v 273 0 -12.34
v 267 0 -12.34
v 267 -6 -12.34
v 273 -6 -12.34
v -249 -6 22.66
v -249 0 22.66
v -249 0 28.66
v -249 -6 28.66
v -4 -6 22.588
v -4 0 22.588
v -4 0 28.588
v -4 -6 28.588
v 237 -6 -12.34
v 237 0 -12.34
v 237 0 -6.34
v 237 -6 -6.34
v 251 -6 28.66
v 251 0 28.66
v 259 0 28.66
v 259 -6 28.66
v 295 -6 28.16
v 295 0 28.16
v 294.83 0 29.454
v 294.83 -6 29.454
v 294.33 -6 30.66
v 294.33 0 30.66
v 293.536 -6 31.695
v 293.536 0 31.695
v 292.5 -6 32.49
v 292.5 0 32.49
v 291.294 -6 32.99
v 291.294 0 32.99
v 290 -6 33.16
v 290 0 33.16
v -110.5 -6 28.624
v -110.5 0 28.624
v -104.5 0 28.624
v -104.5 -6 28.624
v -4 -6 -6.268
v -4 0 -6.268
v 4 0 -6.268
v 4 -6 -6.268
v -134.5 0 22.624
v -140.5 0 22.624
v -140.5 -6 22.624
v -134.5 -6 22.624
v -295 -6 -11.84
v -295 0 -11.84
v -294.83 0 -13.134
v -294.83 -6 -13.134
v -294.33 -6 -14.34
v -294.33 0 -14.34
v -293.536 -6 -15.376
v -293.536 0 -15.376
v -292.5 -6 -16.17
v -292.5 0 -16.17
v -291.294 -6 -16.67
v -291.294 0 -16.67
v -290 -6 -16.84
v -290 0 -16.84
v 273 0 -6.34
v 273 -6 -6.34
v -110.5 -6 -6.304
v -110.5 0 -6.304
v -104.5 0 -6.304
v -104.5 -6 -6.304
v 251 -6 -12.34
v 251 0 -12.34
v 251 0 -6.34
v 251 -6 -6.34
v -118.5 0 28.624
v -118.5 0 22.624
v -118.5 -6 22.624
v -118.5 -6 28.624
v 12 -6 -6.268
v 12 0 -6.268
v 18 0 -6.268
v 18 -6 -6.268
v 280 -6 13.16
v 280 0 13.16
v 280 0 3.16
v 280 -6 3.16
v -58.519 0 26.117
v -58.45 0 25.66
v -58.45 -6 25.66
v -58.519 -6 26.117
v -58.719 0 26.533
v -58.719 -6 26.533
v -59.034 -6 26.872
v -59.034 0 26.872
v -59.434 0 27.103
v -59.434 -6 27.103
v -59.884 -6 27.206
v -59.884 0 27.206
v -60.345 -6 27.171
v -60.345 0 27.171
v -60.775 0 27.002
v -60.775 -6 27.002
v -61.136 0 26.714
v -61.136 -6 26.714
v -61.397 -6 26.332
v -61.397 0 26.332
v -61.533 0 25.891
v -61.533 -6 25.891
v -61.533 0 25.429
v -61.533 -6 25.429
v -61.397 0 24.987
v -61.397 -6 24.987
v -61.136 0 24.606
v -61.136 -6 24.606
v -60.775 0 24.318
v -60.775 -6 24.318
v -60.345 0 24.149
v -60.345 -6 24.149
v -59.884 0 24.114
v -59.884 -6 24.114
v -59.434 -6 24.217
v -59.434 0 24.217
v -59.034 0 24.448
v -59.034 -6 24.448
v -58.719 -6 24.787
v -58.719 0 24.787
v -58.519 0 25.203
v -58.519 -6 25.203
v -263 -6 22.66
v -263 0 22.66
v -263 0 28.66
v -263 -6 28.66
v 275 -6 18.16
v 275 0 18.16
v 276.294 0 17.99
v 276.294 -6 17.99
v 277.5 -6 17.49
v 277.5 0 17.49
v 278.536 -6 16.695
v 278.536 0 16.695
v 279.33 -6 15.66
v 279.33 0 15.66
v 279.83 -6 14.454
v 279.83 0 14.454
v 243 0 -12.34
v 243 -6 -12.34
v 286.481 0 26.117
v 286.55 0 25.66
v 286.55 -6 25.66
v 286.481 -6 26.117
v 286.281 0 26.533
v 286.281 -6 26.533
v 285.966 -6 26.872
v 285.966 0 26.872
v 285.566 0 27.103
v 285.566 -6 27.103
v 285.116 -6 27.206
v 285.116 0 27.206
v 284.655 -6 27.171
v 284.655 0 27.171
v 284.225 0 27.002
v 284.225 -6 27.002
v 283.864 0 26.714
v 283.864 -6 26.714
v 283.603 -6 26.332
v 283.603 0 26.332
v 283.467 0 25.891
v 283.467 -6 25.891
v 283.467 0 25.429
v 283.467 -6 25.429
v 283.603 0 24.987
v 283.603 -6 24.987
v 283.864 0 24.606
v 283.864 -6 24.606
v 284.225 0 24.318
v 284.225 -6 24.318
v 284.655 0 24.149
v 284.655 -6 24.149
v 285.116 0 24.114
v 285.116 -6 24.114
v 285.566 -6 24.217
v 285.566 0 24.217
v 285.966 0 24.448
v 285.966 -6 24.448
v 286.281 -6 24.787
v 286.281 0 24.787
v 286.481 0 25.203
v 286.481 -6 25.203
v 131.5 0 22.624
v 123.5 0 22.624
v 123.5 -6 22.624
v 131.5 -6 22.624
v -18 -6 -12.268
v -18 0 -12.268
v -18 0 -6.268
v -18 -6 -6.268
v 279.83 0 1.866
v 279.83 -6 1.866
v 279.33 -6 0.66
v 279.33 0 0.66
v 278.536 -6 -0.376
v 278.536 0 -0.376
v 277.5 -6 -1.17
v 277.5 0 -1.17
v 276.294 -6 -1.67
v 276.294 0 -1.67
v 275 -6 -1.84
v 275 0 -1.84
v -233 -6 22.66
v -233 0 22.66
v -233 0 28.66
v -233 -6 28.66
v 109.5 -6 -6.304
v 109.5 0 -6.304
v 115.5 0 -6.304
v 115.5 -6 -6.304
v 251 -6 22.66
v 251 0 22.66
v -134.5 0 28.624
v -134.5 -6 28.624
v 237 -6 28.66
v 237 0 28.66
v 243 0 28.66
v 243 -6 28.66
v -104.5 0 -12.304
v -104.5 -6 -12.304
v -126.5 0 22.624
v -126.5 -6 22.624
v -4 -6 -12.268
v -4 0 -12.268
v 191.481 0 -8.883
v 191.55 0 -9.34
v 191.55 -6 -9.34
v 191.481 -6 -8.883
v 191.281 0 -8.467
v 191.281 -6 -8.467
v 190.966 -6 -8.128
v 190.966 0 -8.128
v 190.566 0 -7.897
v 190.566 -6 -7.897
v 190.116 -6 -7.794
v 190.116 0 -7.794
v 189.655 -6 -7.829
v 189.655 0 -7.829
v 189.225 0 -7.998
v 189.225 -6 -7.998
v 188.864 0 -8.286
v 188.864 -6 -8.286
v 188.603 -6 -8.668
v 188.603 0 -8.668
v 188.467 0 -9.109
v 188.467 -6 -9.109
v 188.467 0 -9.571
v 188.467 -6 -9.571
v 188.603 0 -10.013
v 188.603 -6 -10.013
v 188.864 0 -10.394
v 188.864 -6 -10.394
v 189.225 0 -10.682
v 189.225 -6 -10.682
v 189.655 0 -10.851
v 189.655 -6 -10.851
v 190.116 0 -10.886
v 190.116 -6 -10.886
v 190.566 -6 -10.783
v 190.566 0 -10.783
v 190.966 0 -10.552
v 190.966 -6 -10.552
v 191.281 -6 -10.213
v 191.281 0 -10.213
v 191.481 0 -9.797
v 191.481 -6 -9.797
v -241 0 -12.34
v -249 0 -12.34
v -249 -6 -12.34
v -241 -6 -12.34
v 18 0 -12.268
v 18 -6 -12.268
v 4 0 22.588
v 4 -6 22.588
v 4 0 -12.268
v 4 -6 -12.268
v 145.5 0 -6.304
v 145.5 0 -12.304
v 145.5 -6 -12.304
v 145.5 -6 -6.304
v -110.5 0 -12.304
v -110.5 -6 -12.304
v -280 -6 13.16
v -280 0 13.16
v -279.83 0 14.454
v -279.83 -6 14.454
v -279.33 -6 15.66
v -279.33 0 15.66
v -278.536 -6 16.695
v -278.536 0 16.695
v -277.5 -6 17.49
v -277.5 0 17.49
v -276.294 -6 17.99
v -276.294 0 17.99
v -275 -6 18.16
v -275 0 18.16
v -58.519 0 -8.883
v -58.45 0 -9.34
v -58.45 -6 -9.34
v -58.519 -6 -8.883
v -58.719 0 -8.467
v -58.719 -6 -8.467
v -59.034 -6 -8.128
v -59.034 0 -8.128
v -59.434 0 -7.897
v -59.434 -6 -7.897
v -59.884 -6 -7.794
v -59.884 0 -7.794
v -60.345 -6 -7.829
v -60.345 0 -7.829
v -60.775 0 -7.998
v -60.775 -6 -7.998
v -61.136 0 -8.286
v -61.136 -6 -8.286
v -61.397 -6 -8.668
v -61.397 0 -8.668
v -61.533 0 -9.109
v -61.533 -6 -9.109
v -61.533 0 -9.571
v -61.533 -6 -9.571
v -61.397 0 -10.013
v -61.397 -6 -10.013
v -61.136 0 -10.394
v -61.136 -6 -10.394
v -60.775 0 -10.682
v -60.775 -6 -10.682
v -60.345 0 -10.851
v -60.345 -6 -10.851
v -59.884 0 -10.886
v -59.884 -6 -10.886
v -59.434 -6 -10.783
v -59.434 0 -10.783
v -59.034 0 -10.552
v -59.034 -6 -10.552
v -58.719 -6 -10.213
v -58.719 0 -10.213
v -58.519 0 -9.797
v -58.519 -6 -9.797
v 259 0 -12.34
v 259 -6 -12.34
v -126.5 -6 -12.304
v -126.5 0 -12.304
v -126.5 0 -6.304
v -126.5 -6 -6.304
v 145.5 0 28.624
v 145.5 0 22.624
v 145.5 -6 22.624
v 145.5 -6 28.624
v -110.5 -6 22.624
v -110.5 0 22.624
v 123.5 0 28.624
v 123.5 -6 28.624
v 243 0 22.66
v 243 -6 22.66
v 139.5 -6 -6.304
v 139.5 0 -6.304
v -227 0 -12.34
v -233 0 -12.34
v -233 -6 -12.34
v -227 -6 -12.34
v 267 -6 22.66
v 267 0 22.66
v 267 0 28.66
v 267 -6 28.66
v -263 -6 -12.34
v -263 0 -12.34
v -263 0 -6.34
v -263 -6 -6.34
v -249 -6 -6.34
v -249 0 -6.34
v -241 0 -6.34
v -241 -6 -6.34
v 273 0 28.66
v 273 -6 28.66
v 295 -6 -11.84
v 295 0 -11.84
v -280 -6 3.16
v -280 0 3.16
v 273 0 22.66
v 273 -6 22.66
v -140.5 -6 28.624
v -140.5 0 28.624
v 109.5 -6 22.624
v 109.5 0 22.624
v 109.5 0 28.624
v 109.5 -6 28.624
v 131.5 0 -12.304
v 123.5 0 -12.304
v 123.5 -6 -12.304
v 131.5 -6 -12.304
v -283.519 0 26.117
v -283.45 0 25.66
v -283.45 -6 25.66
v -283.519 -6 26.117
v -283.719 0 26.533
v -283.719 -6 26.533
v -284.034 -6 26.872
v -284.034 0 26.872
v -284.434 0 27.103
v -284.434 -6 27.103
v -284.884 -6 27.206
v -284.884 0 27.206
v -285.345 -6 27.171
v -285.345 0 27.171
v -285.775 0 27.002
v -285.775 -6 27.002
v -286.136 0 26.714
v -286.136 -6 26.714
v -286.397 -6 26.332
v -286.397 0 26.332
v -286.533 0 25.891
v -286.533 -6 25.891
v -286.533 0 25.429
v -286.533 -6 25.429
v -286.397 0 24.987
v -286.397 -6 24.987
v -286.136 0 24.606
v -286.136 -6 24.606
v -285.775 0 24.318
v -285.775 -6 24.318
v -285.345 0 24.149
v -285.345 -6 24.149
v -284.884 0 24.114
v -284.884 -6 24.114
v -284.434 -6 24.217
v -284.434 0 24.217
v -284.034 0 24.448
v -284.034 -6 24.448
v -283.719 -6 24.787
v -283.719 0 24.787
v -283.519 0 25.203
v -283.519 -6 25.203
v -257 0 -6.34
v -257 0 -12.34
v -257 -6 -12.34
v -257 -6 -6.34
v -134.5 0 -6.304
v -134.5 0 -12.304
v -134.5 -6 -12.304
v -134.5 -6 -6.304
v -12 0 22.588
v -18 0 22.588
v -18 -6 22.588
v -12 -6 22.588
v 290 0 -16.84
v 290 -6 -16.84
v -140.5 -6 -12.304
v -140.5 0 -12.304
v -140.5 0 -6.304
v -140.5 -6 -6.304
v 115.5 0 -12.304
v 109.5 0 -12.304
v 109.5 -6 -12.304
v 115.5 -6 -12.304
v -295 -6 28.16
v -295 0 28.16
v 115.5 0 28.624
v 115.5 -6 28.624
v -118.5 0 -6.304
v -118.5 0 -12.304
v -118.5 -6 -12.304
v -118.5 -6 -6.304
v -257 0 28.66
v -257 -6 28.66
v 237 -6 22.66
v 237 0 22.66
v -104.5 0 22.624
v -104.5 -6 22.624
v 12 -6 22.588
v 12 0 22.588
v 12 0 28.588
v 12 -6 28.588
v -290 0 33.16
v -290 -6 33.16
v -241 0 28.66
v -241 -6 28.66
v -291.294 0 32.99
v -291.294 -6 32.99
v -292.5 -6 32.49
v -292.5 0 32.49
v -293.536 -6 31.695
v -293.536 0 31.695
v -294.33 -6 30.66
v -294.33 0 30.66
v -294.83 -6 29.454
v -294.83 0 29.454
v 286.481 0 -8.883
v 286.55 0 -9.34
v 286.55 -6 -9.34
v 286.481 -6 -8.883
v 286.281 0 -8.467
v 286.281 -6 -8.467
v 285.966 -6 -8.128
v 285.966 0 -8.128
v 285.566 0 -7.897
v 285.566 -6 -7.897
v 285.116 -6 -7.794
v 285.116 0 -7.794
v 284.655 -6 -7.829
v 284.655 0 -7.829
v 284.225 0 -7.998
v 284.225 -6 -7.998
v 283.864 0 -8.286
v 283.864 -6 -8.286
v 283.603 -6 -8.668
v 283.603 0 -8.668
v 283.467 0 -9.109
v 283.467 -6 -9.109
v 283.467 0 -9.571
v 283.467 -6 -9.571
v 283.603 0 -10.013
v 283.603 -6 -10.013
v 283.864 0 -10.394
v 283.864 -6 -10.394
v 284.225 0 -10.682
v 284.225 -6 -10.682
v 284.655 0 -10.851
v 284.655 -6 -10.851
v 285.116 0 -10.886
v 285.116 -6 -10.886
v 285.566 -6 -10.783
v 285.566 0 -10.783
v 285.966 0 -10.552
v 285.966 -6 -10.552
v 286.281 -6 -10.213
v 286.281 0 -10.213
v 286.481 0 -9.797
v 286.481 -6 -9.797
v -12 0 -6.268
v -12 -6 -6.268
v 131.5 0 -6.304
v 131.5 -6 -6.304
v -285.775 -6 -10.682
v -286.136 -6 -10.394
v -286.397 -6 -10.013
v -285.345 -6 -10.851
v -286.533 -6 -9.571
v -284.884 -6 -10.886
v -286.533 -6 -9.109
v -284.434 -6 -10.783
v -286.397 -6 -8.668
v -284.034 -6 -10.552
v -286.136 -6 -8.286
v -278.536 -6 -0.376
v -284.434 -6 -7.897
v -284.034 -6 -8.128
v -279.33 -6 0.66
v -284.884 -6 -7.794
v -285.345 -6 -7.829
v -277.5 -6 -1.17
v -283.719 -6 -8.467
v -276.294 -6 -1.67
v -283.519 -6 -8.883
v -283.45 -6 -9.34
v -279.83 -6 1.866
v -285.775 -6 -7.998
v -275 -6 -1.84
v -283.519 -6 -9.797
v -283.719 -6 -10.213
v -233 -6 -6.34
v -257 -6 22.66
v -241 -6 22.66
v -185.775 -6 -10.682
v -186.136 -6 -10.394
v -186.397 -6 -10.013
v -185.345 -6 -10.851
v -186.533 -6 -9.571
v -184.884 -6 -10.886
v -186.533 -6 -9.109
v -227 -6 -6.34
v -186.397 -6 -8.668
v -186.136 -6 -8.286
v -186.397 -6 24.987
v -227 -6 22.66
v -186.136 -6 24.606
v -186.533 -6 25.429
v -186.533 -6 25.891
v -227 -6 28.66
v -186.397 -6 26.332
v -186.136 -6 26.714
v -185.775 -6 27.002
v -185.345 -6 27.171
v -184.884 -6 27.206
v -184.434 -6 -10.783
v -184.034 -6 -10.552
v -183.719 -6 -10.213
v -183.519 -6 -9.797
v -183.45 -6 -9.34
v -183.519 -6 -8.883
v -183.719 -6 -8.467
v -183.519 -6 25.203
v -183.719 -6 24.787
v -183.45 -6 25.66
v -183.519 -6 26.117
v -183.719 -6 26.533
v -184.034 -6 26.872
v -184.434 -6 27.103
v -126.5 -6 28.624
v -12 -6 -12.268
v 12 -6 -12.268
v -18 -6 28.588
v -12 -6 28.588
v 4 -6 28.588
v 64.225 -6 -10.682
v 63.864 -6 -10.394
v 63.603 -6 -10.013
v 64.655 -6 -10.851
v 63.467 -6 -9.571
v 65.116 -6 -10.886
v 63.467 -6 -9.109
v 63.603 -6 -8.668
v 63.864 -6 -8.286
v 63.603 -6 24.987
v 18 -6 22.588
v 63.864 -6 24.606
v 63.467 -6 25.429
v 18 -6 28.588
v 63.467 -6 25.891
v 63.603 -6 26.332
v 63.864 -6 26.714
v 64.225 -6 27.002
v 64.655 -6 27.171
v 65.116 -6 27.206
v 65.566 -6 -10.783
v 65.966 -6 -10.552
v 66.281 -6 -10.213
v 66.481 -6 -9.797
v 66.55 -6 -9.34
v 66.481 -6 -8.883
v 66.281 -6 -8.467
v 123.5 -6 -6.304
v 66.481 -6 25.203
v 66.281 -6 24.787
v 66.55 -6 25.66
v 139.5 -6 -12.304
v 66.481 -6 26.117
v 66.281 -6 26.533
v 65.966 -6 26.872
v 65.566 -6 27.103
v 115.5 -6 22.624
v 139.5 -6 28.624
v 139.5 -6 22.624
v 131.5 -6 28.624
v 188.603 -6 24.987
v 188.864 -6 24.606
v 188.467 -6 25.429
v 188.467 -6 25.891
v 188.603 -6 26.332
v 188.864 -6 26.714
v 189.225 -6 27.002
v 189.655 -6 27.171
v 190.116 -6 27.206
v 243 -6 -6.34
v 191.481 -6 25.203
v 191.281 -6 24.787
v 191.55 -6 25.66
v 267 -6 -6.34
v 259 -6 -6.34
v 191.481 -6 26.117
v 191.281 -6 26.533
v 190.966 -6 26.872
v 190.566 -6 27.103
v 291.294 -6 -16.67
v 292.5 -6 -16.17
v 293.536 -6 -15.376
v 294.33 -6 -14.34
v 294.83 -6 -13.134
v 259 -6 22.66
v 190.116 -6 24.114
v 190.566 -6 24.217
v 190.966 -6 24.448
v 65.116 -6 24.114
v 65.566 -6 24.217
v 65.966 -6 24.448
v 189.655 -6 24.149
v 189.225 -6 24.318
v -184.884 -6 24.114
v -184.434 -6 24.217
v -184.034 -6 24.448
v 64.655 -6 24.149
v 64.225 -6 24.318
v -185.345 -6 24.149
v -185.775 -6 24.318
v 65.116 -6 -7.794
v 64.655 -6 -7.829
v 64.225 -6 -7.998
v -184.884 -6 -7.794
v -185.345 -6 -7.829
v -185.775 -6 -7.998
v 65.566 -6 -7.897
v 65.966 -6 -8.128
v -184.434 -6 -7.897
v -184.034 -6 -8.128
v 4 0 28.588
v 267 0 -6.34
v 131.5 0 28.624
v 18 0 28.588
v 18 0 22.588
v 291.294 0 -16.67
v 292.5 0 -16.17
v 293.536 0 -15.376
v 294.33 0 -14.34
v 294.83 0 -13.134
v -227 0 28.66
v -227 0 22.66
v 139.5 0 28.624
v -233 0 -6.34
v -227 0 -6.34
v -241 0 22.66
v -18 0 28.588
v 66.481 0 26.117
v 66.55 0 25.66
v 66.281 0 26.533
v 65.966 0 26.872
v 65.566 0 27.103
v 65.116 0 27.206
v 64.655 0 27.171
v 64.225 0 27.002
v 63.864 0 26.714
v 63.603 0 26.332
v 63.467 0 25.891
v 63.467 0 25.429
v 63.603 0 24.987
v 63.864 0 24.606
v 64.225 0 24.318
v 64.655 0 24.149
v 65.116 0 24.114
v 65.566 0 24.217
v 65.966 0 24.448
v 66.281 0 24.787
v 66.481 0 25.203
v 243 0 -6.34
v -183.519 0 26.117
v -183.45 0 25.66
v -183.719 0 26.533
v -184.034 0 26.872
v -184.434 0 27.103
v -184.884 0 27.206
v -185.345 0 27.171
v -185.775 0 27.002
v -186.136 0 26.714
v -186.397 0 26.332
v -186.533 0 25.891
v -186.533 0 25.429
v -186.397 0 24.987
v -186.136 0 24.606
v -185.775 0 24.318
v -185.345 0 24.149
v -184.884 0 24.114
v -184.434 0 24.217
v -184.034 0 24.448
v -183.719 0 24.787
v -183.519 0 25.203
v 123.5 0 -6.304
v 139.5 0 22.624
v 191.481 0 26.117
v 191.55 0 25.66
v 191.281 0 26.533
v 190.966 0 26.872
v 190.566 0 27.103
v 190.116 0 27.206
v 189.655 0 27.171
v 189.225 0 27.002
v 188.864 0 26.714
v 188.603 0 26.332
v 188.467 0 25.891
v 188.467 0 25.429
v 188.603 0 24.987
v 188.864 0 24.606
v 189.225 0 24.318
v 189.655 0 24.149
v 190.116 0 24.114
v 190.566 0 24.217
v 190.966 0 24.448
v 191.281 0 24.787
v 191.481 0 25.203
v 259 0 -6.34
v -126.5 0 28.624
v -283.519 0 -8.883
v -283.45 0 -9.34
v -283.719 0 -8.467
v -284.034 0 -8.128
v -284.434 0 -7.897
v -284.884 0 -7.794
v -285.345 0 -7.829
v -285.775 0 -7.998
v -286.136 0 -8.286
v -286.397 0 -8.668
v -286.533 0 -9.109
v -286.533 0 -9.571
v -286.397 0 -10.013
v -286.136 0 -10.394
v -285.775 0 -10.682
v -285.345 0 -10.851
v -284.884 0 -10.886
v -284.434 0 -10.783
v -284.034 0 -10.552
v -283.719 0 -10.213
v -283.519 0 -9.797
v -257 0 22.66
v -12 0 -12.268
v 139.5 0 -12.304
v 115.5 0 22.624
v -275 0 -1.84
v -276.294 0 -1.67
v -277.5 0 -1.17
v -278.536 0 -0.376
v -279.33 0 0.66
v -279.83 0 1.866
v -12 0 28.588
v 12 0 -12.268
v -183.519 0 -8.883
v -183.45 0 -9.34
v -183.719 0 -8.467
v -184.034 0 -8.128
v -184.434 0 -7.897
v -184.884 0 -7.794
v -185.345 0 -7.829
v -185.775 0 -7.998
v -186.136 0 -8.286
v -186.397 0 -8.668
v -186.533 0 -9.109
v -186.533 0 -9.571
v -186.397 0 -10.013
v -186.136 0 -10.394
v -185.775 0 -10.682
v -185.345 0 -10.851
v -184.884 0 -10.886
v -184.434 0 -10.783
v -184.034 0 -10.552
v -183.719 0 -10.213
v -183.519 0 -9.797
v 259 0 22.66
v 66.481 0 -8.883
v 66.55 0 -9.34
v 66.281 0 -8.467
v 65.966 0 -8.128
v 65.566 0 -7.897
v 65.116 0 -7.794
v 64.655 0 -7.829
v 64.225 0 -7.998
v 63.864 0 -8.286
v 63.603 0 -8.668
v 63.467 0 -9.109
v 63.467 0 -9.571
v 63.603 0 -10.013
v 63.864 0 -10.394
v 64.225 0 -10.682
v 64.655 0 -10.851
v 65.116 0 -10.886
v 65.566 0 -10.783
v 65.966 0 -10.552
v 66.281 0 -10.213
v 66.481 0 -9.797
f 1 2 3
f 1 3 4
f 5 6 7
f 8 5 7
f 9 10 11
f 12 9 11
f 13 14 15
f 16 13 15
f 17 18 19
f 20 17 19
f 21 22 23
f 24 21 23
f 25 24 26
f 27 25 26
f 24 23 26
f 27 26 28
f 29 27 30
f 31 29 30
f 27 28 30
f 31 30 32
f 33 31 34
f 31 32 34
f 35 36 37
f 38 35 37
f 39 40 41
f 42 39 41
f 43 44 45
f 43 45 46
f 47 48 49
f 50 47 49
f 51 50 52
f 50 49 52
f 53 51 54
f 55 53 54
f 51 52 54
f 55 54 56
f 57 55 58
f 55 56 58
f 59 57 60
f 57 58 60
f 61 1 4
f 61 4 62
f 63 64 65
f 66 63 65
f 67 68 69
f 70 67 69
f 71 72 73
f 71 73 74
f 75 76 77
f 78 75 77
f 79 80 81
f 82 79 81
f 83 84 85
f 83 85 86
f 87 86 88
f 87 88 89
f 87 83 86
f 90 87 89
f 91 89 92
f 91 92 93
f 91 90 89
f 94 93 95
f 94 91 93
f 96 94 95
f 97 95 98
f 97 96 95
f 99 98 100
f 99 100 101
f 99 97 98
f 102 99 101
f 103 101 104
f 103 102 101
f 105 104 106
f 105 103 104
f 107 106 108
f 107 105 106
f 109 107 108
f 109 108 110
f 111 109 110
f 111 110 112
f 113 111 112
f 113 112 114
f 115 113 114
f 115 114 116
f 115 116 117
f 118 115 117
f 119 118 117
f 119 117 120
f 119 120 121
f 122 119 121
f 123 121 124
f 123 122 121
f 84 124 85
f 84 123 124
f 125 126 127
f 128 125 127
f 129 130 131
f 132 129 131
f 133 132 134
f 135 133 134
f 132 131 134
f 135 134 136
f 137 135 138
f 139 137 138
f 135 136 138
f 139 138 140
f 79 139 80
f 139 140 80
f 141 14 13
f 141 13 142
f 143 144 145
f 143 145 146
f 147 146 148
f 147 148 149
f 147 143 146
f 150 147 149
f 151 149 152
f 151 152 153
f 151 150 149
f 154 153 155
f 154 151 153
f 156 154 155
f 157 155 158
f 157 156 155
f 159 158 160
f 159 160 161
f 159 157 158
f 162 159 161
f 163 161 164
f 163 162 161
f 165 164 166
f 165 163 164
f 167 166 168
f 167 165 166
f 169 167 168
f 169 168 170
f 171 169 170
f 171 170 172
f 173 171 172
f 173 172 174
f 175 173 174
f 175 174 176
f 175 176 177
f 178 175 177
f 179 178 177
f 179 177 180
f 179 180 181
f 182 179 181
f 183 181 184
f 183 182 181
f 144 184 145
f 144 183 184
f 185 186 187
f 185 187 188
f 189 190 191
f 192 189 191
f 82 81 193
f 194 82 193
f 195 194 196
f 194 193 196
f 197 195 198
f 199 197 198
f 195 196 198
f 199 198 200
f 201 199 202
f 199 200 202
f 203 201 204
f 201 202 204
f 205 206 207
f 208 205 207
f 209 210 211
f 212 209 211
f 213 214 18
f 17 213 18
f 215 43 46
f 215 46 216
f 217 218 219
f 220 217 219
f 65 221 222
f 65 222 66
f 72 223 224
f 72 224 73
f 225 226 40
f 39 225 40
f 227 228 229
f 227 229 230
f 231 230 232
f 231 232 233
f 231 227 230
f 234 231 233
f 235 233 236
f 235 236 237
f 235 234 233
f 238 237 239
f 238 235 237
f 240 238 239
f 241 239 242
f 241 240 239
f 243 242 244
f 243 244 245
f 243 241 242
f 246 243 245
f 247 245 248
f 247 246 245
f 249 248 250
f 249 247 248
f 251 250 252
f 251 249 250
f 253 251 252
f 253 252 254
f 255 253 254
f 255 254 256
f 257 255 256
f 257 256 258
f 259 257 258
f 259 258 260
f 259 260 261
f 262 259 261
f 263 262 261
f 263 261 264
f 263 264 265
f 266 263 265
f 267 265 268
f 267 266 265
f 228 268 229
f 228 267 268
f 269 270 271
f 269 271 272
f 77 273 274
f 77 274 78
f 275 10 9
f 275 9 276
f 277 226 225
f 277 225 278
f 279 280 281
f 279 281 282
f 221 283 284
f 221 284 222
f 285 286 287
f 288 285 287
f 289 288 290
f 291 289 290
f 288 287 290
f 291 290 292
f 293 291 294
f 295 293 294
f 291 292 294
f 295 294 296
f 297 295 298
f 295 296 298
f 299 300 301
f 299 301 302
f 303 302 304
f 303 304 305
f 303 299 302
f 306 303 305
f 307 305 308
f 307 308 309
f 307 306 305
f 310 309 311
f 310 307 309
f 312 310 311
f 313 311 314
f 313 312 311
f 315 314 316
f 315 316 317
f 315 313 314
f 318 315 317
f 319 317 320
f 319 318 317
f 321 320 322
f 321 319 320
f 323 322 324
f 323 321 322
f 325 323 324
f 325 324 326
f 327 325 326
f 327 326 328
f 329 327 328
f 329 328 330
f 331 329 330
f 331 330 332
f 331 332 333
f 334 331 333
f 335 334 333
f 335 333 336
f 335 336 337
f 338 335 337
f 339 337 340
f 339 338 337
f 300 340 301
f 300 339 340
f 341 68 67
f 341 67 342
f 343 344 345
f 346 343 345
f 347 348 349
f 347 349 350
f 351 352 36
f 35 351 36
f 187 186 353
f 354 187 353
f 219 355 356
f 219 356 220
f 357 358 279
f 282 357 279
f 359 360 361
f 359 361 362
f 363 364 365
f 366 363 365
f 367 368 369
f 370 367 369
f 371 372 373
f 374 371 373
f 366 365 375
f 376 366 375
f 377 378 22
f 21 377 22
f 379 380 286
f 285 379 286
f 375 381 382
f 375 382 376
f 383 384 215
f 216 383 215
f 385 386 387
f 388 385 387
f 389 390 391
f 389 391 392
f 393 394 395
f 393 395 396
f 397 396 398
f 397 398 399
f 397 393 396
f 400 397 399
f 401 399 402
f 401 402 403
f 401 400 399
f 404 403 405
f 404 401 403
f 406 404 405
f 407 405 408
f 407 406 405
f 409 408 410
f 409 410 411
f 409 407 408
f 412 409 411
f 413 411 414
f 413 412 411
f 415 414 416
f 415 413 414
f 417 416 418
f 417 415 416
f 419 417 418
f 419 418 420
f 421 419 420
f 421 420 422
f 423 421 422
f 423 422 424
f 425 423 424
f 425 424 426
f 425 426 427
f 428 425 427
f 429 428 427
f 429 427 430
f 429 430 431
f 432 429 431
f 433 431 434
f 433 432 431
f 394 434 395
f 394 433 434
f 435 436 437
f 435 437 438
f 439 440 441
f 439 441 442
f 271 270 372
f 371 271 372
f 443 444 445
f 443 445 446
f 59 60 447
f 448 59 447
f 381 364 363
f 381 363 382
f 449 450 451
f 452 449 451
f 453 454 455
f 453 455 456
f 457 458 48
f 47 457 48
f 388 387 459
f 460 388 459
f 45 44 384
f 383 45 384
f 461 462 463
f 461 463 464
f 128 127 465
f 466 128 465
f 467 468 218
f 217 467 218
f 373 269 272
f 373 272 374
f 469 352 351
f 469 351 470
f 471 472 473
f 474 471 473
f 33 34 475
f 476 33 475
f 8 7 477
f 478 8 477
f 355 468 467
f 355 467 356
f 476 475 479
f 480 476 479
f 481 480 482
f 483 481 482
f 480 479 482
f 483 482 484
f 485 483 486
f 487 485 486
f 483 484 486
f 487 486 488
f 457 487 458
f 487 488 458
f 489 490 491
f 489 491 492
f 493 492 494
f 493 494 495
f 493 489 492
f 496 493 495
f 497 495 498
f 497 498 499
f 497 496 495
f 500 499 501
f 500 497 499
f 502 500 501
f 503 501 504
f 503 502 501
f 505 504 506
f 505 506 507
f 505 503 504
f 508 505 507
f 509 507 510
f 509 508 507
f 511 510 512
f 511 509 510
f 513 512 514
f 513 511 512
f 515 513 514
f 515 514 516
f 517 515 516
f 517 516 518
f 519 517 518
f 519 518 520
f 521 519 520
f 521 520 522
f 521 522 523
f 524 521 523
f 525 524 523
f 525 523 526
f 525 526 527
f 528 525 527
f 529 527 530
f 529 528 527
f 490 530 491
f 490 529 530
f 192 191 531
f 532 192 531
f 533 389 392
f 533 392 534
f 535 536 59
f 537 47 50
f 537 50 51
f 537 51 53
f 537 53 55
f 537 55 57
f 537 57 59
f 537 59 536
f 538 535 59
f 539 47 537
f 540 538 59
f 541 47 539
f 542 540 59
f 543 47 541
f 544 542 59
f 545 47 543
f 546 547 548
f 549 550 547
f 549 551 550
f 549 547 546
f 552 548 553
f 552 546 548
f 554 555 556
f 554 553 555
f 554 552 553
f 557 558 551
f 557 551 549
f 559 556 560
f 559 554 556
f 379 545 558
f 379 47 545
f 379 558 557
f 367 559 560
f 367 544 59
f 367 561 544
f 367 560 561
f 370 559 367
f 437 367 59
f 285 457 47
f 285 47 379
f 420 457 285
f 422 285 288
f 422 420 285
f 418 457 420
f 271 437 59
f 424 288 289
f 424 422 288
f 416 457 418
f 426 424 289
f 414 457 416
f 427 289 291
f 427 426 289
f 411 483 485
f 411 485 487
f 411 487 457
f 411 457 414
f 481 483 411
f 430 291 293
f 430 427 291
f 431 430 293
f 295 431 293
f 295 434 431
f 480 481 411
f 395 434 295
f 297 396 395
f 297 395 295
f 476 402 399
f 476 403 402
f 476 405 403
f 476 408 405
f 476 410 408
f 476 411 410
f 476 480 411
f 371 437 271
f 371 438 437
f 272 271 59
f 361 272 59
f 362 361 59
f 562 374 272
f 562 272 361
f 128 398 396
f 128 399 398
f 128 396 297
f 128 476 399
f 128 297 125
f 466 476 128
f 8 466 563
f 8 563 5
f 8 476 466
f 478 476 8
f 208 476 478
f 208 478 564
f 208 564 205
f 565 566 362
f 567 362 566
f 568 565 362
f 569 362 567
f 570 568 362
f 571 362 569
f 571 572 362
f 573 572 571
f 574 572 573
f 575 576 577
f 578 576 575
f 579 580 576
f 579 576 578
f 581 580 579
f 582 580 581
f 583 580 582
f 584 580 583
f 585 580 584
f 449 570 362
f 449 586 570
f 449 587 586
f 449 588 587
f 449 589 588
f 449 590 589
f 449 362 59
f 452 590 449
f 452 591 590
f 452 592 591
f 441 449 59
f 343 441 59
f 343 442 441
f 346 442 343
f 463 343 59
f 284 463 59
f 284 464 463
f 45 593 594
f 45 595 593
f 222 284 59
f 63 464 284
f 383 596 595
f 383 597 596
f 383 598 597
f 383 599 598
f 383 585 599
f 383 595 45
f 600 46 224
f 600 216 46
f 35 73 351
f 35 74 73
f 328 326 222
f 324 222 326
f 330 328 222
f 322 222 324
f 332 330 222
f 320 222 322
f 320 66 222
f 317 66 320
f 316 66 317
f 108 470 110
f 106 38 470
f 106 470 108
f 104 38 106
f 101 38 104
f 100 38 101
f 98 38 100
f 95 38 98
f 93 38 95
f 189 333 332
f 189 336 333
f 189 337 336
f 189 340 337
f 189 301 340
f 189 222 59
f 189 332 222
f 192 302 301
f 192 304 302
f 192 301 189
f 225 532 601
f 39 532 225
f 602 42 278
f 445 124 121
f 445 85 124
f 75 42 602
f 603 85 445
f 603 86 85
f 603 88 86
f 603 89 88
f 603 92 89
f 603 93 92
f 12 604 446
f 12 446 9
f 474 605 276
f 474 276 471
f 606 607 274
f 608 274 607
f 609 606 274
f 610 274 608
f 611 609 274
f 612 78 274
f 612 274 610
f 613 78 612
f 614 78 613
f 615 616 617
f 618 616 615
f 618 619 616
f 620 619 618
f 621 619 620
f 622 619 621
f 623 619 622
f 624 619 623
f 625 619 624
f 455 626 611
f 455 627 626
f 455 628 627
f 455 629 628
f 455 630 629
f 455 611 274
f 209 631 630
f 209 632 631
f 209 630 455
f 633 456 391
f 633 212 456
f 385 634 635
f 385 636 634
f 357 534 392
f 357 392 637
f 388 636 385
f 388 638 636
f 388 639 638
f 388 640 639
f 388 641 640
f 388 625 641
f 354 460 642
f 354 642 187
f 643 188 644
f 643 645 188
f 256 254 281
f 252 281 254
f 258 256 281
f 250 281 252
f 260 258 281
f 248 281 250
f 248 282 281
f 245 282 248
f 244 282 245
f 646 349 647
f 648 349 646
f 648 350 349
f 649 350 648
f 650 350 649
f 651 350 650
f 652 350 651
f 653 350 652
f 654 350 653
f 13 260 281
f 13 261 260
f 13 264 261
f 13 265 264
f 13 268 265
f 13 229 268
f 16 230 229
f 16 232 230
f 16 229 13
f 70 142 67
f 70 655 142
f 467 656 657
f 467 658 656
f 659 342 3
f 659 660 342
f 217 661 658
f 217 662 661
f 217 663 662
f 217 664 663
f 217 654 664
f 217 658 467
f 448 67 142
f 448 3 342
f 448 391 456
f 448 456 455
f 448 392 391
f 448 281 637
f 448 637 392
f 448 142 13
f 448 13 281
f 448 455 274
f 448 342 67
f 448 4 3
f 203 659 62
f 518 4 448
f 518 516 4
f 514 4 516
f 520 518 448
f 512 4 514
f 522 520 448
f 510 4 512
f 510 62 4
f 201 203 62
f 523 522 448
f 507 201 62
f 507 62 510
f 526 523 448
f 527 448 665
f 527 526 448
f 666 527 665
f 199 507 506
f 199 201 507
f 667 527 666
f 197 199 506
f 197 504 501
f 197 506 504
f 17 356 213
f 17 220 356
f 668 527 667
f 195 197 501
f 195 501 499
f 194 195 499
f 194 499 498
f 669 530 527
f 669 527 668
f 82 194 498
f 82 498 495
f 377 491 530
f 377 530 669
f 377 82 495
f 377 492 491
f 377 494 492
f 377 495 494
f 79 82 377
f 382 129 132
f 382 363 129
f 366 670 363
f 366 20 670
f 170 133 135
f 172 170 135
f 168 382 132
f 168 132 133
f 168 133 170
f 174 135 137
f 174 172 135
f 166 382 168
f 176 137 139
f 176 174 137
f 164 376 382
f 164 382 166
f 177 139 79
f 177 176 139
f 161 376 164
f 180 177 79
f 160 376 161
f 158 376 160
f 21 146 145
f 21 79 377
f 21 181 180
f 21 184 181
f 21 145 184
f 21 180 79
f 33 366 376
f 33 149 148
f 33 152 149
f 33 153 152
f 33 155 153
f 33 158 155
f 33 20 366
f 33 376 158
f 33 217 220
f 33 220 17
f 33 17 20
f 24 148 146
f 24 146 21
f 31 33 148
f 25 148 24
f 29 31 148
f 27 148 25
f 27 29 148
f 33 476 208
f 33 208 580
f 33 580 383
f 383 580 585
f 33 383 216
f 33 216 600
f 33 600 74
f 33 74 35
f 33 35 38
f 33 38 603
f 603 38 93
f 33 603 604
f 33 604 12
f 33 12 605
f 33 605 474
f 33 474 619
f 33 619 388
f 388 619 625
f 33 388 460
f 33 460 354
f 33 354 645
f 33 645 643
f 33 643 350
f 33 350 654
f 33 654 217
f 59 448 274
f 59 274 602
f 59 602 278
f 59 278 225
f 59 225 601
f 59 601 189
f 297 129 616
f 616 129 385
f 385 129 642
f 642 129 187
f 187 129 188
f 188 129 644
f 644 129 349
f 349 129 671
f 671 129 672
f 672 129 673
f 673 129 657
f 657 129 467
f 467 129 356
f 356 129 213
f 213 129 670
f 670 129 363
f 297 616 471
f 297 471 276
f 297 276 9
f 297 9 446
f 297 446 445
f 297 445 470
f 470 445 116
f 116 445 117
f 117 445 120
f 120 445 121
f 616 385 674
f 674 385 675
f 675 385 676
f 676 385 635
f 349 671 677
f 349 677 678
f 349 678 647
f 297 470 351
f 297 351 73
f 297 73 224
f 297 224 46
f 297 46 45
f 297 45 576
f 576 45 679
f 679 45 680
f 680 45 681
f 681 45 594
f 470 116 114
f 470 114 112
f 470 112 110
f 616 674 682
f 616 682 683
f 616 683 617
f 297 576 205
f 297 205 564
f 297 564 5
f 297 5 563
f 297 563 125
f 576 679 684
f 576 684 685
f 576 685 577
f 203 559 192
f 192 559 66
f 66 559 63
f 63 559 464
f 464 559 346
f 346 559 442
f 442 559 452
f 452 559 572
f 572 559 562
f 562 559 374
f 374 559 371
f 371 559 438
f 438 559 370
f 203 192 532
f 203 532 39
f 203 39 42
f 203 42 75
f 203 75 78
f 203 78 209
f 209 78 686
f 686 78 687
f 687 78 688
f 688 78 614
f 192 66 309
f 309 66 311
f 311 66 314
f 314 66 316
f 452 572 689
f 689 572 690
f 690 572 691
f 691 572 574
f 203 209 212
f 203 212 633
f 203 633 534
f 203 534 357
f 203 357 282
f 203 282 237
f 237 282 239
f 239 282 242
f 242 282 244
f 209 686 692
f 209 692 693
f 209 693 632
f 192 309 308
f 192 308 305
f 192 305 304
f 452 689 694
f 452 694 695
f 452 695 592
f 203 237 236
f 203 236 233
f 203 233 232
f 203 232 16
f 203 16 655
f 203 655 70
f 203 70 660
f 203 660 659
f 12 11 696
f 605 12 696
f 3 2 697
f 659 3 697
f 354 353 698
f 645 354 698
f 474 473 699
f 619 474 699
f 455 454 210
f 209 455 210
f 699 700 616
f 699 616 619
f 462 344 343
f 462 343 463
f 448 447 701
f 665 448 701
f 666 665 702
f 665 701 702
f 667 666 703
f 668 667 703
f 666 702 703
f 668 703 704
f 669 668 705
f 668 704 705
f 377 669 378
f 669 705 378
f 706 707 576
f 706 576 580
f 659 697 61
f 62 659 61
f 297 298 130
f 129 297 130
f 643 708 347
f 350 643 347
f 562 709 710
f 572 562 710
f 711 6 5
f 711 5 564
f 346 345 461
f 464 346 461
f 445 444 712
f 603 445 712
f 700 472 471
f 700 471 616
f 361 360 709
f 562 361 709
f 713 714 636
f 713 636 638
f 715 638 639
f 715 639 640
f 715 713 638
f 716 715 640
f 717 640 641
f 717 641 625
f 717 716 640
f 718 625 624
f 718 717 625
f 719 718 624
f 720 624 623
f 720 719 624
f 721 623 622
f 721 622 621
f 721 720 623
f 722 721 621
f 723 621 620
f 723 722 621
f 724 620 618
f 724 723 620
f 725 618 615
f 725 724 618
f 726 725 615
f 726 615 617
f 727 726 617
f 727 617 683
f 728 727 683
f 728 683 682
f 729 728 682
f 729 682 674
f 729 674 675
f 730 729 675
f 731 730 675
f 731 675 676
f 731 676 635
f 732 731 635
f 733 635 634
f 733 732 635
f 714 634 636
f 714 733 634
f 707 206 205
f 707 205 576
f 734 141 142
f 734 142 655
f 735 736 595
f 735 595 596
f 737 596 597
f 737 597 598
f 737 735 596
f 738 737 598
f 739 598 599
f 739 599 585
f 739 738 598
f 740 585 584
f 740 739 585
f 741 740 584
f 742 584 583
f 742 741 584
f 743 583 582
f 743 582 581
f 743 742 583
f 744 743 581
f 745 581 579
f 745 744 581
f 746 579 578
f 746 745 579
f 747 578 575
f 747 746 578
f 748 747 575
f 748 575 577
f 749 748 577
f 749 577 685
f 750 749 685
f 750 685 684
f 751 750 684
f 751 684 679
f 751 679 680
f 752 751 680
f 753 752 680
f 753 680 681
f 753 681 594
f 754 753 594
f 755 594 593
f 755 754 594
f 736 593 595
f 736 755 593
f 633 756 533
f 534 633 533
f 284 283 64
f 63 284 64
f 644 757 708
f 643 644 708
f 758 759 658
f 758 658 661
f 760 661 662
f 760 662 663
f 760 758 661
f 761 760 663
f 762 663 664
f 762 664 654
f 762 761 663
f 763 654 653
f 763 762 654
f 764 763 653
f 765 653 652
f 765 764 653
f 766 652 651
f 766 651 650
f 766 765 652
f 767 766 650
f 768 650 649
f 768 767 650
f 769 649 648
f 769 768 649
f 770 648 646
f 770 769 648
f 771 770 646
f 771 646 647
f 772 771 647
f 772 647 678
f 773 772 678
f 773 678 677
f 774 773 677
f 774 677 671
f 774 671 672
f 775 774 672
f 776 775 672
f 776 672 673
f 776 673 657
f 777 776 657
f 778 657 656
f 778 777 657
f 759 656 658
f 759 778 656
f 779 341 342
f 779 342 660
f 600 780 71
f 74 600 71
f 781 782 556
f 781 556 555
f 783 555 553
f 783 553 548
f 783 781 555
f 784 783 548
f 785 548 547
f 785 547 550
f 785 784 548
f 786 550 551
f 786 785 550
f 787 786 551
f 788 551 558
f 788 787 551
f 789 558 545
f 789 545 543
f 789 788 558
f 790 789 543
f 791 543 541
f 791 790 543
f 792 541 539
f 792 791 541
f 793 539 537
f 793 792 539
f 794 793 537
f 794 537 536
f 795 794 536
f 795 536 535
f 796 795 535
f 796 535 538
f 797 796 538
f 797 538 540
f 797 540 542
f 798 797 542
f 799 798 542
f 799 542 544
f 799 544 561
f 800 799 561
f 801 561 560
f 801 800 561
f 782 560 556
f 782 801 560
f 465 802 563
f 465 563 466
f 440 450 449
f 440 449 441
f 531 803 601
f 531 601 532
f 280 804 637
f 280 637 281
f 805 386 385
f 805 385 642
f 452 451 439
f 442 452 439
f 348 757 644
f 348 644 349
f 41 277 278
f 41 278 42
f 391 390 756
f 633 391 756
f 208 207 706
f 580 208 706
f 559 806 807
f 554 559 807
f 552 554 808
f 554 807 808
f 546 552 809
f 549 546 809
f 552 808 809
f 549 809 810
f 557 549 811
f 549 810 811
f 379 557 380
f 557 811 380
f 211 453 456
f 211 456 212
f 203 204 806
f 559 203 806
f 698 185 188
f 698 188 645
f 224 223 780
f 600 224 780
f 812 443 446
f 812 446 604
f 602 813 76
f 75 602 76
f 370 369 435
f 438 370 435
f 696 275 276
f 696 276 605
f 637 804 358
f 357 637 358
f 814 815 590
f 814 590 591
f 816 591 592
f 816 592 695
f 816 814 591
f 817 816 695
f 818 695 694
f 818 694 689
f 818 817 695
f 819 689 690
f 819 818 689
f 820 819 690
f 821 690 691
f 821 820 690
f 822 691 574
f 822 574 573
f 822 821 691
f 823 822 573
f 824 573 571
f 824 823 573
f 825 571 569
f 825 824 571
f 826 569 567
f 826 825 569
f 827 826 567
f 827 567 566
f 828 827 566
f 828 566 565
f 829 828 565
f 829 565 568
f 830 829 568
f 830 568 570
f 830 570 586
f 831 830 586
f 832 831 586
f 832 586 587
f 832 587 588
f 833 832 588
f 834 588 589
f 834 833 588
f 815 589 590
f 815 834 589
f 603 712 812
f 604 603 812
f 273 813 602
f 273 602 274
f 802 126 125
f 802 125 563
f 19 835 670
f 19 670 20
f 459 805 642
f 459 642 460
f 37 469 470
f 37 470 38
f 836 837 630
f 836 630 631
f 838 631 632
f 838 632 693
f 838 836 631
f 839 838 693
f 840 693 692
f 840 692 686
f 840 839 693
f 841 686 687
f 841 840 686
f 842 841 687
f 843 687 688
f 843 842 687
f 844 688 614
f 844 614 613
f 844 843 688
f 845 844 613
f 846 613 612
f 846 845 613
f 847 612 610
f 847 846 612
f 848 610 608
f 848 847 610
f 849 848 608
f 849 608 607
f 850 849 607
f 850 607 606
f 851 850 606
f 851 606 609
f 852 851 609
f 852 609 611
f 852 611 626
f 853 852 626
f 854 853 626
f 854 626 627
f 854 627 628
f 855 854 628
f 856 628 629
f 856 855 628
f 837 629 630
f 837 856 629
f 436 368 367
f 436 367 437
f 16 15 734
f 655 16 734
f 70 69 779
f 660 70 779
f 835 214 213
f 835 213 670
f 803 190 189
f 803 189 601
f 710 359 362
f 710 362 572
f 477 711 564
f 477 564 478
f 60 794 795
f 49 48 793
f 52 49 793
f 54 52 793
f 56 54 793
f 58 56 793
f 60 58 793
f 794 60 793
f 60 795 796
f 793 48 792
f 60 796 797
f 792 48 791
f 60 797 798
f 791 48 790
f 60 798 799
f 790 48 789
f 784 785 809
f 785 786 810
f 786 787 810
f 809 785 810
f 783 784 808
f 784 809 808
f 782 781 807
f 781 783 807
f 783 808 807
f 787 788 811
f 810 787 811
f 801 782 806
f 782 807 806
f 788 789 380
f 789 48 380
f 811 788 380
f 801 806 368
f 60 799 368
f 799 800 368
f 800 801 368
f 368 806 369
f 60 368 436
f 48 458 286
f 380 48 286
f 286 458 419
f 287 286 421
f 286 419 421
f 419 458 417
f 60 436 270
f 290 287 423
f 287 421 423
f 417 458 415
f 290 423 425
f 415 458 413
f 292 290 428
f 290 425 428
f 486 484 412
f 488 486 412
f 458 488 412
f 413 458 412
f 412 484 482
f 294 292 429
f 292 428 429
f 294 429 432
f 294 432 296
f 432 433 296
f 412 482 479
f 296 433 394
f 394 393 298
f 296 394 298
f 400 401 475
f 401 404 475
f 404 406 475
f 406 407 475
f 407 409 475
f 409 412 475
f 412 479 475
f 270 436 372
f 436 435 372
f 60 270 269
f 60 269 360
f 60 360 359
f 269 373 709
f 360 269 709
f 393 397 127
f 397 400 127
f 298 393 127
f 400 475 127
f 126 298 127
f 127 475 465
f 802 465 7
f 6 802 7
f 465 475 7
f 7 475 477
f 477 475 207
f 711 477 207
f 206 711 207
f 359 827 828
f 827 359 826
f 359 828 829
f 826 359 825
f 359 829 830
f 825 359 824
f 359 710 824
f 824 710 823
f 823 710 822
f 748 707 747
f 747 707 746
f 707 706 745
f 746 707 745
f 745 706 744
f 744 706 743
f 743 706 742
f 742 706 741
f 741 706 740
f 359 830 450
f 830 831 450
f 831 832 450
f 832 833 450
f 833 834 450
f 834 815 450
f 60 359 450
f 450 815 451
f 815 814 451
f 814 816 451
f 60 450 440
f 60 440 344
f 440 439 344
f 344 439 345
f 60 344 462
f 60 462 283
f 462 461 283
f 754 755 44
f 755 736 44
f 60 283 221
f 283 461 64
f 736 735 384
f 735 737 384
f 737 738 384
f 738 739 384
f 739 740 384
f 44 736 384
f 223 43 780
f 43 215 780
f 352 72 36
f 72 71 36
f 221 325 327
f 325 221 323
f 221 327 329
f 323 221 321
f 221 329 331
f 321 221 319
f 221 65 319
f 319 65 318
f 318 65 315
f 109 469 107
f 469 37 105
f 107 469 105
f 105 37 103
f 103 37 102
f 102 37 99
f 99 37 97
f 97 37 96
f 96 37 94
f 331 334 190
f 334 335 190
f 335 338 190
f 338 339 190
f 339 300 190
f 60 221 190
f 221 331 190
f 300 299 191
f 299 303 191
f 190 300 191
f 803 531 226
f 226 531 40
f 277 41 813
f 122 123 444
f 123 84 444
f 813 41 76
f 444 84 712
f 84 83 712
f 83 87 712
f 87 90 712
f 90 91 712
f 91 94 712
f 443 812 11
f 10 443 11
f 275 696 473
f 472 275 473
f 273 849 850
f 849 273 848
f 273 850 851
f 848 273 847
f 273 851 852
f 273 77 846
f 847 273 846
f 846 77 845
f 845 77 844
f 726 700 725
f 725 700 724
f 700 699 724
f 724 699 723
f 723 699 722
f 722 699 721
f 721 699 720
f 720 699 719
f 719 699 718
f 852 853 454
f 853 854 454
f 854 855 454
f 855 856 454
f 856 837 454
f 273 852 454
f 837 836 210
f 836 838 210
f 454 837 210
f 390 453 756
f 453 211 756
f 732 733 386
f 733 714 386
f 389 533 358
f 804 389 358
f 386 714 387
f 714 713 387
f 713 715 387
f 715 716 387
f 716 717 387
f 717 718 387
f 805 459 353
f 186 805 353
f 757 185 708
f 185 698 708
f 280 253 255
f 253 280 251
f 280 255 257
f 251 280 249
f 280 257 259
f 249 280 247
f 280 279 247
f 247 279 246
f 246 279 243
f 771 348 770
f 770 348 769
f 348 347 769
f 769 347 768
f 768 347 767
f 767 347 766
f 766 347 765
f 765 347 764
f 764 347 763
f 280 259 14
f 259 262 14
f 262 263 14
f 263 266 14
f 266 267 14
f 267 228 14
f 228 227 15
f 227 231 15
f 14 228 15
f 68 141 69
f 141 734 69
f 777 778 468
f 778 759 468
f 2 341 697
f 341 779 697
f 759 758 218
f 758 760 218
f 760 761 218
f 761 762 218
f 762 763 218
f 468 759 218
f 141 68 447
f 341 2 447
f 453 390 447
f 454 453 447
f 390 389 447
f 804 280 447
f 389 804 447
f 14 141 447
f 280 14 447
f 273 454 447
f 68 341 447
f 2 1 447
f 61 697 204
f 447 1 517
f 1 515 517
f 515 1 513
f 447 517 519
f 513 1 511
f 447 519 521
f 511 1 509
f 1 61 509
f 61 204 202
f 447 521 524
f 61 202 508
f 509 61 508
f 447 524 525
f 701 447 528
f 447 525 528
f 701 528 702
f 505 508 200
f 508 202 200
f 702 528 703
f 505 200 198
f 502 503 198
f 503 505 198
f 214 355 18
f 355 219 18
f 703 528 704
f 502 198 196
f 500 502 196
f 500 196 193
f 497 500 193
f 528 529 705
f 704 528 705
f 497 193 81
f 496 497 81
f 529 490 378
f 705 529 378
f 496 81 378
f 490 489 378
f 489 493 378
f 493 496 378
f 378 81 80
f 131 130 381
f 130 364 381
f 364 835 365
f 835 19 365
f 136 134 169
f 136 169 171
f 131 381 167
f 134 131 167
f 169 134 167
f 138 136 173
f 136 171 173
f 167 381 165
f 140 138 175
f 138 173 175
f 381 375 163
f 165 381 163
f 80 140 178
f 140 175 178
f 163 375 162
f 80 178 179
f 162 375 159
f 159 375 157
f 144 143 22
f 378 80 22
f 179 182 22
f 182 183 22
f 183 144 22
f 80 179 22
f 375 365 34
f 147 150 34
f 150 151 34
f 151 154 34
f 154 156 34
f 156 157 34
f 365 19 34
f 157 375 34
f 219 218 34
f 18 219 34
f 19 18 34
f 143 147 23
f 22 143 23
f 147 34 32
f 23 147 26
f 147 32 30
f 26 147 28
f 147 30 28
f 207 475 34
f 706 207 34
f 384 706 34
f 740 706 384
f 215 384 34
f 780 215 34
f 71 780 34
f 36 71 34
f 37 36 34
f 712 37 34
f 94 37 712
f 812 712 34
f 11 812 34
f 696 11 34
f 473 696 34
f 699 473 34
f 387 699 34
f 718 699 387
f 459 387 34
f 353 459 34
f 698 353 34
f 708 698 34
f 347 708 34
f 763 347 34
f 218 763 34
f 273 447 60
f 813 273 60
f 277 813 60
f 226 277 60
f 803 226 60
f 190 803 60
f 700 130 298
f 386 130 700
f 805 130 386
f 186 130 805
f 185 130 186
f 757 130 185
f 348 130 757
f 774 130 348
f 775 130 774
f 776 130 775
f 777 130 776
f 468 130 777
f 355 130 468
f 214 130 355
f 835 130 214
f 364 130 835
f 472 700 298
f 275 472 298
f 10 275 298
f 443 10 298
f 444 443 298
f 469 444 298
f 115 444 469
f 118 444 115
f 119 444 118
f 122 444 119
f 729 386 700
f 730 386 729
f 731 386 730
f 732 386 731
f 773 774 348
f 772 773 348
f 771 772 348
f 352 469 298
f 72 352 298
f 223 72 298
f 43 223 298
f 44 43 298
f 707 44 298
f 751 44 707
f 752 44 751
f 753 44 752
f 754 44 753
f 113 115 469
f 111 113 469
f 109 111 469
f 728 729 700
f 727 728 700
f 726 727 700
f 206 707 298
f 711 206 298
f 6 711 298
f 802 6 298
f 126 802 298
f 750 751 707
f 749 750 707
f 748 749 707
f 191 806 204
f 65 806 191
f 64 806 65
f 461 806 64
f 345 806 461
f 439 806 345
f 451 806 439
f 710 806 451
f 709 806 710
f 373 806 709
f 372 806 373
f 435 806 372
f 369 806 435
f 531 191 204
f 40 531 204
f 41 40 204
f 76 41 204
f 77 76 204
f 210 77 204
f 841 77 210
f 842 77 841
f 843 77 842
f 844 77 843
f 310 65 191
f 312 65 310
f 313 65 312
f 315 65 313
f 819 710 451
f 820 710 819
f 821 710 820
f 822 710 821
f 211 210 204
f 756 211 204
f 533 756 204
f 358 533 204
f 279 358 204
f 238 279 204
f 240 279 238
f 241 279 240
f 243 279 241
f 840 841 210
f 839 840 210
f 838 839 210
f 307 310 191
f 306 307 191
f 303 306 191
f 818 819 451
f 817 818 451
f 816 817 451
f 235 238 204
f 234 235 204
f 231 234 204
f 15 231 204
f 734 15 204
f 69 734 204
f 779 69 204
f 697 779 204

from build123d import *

# Parameters (mm, degrees)
F0_R     = 1.55
F0_W     = 6
F0_H     = 6
F0_W_2   = 8
F1_DEPTH = 6


with BuildPart() as f1:
    # F0 (on Front) → F1 (new body)
    with BuildSketch(Plane.XZ):
        with BuildLine():
            Line((290, 33.159883), (-290, 33.159883))
            ThreePointArc((-290, 33.159883), (-293.535534, 31.695417), (-295, 28.159883))
            Line((-295, 28.159883), (-295, -11.840117))
            ThreePointArc((-295, -11.840117), (-293.535534, -15.375651), (-290, -16.840117))
            Line((-290, -16.840117), (290, -16.840117))
            ThreePointArc((290, -16.840117), (293.535534, -15.375651), (295, -11.840117))
            Line((295, -11.840117), (295, 28.159883))
            ThreePointArc((295, 28.159883), (293.535534, 31.695417), (290, 33.159883))
        make_face()
        with Locations((-285, -9.340117)):
            Circle(F0_R, mode=Mode.SUBTRACT)
        with Locations((-260, -9.340117)):
            Rectangle(F0_W, F0_H, mode=Mode.SUBTRACT)
        with Locations((-245, -9.340117)):
            Rectangle(F0_W_2, F0_H, mode=Mode.SUBTRACT)
        with Locations((-230, -9.340117)):
            Rectangle(F0_W, F0_H, mode=Mode.SUBTRACT)
        with Locations((-185, -9.340117)):
            Circle(F0_R, mode=Mode.SUBTRACT)
        with Locations((-137.5, -9.304218)):
            Rectangle(F0_W, F0_H, mode=Mode.SUBTRACT)
        with Locations((-122.5, -9.304218)):
            Rectangle(F0_W_2, F0_H, mode=Mode.SUBTRACT)
        with Locations((-107.5, -9.304218)):
            Rectangle(F0_W, F0_H, mode=Mode.SUBTRACT)
        with Locations((-60, -9.340117)):
            Circle(F0_R, mode=Mode.SUBTRACT)
        with Locations((-15, -9.268318)):
            Rectangle(F0_W, F0_H, mode=Mode.SUBTRACT)
        with Locations((0, -9.268318)):
            Rectangle(F0_W_2, F0_H, mode=Mode.SUBTRACT)
        with Locations((15, -9.268318)):
            Rectangle(F0_W, F0_H, mode=Mode.SUBTRACT)
        with Locations((65, -9.340117)):
            Circle(F0_R, mode=Mode.SUBTRACT)
        with Locations((112.5, -9.304218)):
            Rectangle(F0_W, F0_H, mode=Mode.SUBTRACT)
        with Locations((127.5, -9.304218)):
            Rectangle(F0_W_2, F0_H, mode=Mode.SUBTRACT)
        with Locations((142.5, -9.304218)):
            Rectangle(F0_W, F0_H, mode=Mode.SUBTRACT)
        with Locations((190, -9.340117)):
            Circle(F0_R, mode=Mode.SUBTRACT)
        with Locations((240, -9.340117)):
            Rectangle(F0_W, F0_H, mode=Mode.SUBTRACT)
        with Locations((255, -9.340117)):
            Rectangle(F0_W_2, F0_H, mode=Mode.SUBTRACT)
        with Locations((270, -9.340117)):
            Rectangle(F0_W, F0_H, mode=Mode.SUBTRACT)
        with Locations((285, -9.340117)):
            Circle(F0_R, mode=Mode.SUBTRACT)
        with Locations((-285, 25.659883)):
            Circle(F0_R, mode=Mode.SUBTRACT)
        with Locations((-260, 25.659883)):
            Rectangle(F0_W, F0_H, mode=Mode.SUBTRACT)
        with Locations((-245, 25.659883)):
            Rectangle(F0_W_2, F0_H, mode=Mode.SUBTRACT)
        with Locations((-230, 25.659883)):
            Rectangle(F0_W, F0_H, mode=Mode.SUBTRACT)
        with Locations((-185, 25.659883)):
            Circle(F0_R, mode=Mode.SUBTRACT)
        with Locations((-137.5, 25.623984)):
            Rectangle(F0_W, F0_H, mode=Mode.SUBTRACT)
        with Locations((-122.5, 25.623984)):
            Rectangle(F0_W_2, F0_H, mode=Mode.SUBTRACT)
        with Locations((-107.5, 25.623984)):
            Rectangle(F0_W, F0_H, mode=Mode.SUBTRACT)
        with Locations((-60, 25.659883)):
            Circle(F0_R, mode=Mode.SUBTRACT)
        with Locations((-15, 25.588085)):
            Rectangle(F0_W, F0_H, mode=Mode.SUBTRACT)
        with BuildLine():
            ThreePointArc((-280, 13.159883), (-278.535534, 16.695417), (-275, 18.159883))
            Line((-275, 18.159883), (275, 18.159883))
            ThreePointArc((275, 18.159883), (278.535534, 16.695417), (280, 13.159883))
            Line((280, 13.159883), (280, 3.159883))
            ThreePointArc((280, 3.159883), (278.535534, -0.375651), (275, -1.840117))
            Line((275, -1.840117), (-275, -1.840117))
            ThreePointArc((-275, -1.840117), (-278.535534, -0.375651), (-280, 3.159883))
            Line((-280, 3.159883), (-280, 13.159883))
        make_face(mode=Mode.SUBTRACT)
        with Locations((0, 25.588085)):
            Rectangle(F0_W_2, F0_H, mode=Mode.SUBTRACT)
        with Locations((15, 25.588085)):
            Rectangle(F0_W, F0_H, mode=Mode.SUBTRACT)
        with Locations((65, 25.659883)):
            Circle(F0_R, mode=Mode.SUBTRACT)
        with Locations((112.5, 25.623984)):
            Rectangle(F0_W, F0_H, mode=Mode.SUBTRACT)
        with Locations((127.5, 25.623984)):
            Rectangle(F0_W_2, F0_H, mode=Mode.SUBTRACT)
        with Locations((142.5, 25.623984)):
            Rectangle(F0_W, F0_H, mode=Mode.SUBTRACT)
        with Locations((190, 25.659883)):
            Circle(F0_R, mode=Mode.SUBTRACT)
        with Locations((240, 25.659883)):
            Rectangle(F0_W, F0_H, mode=Mode.SUBTRACT)
        with Locations((255, 25.659883)):
            Rectangle(F0_W_2, F0_H, mode=Mode.SUBTRACT)
        with Locations((270, 25.659883)):
            Rectangle(F0_W, F0_H, mode=Mode.SUBTRACT)
        with Locations((285, 25.659883)):
            Circle(F0_R, mode=Mode.SUBTRACT)
    extrude(amount=F1_DEPTH)


solid = f1.part
